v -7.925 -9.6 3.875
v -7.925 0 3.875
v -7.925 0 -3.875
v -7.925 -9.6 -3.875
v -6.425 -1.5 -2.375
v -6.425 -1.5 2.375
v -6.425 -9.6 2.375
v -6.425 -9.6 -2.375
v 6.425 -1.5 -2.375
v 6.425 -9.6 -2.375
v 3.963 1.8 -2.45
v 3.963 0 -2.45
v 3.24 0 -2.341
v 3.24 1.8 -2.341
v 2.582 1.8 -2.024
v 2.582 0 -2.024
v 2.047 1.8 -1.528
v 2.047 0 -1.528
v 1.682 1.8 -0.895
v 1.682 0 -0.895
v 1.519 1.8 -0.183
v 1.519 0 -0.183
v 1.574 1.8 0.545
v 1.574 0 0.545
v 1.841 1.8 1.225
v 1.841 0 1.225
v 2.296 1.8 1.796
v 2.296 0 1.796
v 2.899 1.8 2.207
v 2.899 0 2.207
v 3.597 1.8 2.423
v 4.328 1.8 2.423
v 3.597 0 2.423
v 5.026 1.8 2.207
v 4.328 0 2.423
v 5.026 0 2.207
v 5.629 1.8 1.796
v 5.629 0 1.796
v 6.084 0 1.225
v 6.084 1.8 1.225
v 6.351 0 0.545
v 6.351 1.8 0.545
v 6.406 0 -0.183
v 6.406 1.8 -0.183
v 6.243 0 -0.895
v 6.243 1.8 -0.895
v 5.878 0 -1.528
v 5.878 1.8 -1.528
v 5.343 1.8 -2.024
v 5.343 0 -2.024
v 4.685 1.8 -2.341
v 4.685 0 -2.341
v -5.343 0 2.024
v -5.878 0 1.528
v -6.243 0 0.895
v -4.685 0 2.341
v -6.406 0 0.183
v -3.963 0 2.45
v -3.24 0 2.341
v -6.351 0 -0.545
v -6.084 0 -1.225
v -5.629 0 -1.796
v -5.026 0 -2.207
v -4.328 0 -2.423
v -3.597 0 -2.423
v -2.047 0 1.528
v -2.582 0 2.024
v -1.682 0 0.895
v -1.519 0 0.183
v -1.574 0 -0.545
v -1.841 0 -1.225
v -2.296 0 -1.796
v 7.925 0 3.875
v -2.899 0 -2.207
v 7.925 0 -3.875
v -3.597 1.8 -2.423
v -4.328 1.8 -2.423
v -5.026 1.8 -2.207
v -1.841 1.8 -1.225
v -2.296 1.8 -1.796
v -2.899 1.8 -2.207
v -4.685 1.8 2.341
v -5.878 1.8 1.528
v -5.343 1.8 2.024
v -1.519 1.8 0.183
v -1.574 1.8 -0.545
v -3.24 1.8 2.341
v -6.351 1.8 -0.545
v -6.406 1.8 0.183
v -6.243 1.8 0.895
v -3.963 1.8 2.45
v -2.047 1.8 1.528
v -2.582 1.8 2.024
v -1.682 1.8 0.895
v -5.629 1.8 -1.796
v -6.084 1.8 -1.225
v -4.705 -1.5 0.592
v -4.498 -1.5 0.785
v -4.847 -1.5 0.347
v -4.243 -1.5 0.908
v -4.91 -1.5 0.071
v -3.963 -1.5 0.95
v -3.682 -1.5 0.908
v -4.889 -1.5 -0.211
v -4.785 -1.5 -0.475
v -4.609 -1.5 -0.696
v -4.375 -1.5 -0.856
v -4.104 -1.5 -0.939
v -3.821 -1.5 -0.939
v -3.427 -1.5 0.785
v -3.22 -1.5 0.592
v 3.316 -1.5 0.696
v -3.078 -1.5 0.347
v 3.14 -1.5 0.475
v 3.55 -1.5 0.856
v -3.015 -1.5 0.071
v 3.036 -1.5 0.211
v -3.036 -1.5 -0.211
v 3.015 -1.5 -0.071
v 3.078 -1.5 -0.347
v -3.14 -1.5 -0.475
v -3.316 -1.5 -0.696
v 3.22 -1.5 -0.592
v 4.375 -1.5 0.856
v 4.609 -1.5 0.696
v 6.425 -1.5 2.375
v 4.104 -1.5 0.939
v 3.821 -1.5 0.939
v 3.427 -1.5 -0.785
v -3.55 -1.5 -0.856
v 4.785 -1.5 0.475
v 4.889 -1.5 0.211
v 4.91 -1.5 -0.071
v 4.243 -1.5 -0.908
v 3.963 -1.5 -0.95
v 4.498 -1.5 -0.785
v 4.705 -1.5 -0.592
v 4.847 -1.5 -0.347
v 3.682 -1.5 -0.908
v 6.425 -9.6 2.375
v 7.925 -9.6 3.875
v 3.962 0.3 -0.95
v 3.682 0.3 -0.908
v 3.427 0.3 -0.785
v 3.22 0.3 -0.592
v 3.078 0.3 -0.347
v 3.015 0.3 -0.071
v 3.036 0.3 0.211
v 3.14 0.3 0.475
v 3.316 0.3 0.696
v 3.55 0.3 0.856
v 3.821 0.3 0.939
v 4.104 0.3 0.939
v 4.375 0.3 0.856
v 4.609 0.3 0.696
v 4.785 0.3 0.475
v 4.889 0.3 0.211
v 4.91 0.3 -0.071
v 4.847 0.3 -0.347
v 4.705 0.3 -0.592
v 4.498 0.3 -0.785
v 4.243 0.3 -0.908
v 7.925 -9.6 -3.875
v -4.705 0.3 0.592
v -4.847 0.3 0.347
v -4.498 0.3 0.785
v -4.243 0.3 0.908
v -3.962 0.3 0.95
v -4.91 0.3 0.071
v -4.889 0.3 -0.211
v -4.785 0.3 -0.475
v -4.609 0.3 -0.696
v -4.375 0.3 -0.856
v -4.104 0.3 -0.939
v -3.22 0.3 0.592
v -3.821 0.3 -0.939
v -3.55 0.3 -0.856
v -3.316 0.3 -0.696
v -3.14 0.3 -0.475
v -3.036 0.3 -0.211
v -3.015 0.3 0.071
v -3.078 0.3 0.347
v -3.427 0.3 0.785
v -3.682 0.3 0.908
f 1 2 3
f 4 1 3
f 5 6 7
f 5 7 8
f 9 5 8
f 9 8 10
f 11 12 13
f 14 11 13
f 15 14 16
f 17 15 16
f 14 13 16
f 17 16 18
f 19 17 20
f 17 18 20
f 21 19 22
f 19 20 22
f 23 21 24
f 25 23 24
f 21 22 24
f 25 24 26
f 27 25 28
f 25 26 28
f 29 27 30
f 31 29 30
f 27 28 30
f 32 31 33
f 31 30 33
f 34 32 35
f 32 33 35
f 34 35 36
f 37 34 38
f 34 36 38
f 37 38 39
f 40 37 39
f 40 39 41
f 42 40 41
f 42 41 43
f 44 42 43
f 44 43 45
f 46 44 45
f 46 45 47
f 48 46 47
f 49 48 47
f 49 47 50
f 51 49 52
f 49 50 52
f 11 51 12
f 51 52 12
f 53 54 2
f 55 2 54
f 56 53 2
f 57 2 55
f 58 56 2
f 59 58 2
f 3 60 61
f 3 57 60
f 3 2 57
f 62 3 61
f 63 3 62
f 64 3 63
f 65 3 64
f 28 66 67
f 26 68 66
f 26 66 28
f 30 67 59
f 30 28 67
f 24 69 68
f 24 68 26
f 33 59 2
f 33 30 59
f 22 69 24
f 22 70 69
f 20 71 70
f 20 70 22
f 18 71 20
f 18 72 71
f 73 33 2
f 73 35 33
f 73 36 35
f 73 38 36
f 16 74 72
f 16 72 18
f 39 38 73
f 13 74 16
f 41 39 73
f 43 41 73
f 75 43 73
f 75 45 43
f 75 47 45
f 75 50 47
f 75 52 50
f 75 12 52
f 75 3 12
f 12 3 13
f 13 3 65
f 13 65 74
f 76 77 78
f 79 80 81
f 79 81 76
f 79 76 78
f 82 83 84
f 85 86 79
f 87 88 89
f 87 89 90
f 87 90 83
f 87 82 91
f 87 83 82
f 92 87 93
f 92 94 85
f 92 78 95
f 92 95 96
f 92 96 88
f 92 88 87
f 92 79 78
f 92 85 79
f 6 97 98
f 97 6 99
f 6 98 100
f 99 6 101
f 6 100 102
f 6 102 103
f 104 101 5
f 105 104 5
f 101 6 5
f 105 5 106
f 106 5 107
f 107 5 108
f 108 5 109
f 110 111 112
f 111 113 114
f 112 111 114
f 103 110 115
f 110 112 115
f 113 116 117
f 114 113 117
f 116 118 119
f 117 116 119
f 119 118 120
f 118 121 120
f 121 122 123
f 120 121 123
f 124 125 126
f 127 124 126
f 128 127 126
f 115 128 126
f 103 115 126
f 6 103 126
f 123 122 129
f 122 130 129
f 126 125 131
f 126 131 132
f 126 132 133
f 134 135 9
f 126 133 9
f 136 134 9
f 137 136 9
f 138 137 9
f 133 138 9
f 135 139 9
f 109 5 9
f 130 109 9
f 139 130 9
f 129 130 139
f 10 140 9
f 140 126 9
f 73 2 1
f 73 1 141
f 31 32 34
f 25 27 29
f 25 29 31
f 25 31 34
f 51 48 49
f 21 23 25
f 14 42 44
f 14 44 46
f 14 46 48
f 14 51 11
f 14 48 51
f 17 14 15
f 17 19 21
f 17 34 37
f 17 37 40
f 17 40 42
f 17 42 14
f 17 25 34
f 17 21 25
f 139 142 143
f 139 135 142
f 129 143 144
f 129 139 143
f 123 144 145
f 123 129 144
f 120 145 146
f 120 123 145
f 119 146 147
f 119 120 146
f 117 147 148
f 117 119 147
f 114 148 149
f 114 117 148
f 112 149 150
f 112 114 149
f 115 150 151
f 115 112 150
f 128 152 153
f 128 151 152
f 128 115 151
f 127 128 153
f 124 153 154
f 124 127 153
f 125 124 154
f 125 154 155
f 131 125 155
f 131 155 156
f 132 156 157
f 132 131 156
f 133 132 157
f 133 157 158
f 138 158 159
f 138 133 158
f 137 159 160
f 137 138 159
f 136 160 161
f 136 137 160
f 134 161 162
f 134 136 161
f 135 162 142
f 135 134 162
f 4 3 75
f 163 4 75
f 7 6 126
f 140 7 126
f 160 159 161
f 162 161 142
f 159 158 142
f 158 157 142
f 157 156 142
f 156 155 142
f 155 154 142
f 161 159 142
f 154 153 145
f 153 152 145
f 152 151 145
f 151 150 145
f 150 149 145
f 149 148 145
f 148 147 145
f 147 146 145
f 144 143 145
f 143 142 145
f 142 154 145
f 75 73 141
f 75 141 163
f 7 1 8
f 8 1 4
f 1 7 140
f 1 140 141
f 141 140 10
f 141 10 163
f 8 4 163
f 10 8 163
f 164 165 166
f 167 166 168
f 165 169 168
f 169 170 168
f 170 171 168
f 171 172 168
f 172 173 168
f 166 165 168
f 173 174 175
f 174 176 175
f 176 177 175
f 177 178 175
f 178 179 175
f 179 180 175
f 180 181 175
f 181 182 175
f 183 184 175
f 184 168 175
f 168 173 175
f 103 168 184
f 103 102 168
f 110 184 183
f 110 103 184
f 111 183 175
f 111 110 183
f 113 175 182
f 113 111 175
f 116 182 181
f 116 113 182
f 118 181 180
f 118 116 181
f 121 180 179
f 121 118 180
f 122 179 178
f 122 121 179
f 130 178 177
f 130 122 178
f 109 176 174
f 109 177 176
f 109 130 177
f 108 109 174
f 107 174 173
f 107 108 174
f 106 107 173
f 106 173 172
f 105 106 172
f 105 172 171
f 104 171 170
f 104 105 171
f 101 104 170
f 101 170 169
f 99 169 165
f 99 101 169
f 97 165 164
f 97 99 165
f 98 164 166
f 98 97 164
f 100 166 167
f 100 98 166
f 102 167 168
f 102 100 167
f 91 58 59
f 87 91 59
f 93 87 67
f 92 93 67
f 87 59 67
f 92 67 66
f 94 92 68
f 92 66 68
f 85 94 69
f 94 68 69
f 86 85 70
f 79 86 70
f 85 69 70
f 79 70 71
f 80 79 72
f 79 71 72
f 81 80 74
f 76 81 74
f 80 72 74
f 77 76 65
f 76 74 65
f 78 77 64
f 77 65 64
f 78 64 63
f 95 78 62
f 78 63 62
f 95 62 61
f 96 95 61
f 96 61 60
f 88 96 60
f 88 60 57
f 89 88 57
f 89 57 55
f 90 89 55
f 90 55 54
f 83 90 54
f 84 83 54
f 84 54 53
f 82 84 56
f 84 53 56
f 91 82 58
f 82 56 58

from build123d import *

# Parameters (mm, degrees)
SKETCH1_W           = 15.85
SKETCH1_H           = 7.75
BOSS_EXTRUDE1_DEPTH = 9.6
SKETCH2_R           = 2.45
BOSS_EXTRUDE2_DEPTH = 1.8
SHELL1_T            = -1.5


with BuildPart() as part:
    # Sketch1 → Boss-Extrude1 (new body)
    with BuildSketch(Plane(origin=(0, 0, 0), x_dir=(1, 0, 0), z_dir=(0, 1, 0))):
        Rectangle(SKETCH1_W, SKETCH1_H)
    extrude(amount=-BOSS_EXTRUDE1_DEPTH)

    # Sketch2 → Boss-Extrude2 (add)
    with BuildSketch(Plane(origin=(0, 0, 0), x_dir=(1, 0, 0), z_dir=(0, 1, 0))):
        with Locations(Location((-3.9625, 0, 0), (0, 0, 270))):
            Circle(SKETCH2_R)
        with Locations(Location((3.9625, 0, 0), (0, 0, 90))):
            Circle(SKETCH2_R)
    extrude(amount=BOSS_EXTRUDE2_DEPTH)

    # Shell1
    shell1_openings = [part.faces().sort_by_distance(p)[0] for p in [
        (0, -9.6, 0),
    ]]
    offset(amount=SHELL1_T, openings=shell1_openings, kind=Kind.INTERSECTION)


solid = part.part
